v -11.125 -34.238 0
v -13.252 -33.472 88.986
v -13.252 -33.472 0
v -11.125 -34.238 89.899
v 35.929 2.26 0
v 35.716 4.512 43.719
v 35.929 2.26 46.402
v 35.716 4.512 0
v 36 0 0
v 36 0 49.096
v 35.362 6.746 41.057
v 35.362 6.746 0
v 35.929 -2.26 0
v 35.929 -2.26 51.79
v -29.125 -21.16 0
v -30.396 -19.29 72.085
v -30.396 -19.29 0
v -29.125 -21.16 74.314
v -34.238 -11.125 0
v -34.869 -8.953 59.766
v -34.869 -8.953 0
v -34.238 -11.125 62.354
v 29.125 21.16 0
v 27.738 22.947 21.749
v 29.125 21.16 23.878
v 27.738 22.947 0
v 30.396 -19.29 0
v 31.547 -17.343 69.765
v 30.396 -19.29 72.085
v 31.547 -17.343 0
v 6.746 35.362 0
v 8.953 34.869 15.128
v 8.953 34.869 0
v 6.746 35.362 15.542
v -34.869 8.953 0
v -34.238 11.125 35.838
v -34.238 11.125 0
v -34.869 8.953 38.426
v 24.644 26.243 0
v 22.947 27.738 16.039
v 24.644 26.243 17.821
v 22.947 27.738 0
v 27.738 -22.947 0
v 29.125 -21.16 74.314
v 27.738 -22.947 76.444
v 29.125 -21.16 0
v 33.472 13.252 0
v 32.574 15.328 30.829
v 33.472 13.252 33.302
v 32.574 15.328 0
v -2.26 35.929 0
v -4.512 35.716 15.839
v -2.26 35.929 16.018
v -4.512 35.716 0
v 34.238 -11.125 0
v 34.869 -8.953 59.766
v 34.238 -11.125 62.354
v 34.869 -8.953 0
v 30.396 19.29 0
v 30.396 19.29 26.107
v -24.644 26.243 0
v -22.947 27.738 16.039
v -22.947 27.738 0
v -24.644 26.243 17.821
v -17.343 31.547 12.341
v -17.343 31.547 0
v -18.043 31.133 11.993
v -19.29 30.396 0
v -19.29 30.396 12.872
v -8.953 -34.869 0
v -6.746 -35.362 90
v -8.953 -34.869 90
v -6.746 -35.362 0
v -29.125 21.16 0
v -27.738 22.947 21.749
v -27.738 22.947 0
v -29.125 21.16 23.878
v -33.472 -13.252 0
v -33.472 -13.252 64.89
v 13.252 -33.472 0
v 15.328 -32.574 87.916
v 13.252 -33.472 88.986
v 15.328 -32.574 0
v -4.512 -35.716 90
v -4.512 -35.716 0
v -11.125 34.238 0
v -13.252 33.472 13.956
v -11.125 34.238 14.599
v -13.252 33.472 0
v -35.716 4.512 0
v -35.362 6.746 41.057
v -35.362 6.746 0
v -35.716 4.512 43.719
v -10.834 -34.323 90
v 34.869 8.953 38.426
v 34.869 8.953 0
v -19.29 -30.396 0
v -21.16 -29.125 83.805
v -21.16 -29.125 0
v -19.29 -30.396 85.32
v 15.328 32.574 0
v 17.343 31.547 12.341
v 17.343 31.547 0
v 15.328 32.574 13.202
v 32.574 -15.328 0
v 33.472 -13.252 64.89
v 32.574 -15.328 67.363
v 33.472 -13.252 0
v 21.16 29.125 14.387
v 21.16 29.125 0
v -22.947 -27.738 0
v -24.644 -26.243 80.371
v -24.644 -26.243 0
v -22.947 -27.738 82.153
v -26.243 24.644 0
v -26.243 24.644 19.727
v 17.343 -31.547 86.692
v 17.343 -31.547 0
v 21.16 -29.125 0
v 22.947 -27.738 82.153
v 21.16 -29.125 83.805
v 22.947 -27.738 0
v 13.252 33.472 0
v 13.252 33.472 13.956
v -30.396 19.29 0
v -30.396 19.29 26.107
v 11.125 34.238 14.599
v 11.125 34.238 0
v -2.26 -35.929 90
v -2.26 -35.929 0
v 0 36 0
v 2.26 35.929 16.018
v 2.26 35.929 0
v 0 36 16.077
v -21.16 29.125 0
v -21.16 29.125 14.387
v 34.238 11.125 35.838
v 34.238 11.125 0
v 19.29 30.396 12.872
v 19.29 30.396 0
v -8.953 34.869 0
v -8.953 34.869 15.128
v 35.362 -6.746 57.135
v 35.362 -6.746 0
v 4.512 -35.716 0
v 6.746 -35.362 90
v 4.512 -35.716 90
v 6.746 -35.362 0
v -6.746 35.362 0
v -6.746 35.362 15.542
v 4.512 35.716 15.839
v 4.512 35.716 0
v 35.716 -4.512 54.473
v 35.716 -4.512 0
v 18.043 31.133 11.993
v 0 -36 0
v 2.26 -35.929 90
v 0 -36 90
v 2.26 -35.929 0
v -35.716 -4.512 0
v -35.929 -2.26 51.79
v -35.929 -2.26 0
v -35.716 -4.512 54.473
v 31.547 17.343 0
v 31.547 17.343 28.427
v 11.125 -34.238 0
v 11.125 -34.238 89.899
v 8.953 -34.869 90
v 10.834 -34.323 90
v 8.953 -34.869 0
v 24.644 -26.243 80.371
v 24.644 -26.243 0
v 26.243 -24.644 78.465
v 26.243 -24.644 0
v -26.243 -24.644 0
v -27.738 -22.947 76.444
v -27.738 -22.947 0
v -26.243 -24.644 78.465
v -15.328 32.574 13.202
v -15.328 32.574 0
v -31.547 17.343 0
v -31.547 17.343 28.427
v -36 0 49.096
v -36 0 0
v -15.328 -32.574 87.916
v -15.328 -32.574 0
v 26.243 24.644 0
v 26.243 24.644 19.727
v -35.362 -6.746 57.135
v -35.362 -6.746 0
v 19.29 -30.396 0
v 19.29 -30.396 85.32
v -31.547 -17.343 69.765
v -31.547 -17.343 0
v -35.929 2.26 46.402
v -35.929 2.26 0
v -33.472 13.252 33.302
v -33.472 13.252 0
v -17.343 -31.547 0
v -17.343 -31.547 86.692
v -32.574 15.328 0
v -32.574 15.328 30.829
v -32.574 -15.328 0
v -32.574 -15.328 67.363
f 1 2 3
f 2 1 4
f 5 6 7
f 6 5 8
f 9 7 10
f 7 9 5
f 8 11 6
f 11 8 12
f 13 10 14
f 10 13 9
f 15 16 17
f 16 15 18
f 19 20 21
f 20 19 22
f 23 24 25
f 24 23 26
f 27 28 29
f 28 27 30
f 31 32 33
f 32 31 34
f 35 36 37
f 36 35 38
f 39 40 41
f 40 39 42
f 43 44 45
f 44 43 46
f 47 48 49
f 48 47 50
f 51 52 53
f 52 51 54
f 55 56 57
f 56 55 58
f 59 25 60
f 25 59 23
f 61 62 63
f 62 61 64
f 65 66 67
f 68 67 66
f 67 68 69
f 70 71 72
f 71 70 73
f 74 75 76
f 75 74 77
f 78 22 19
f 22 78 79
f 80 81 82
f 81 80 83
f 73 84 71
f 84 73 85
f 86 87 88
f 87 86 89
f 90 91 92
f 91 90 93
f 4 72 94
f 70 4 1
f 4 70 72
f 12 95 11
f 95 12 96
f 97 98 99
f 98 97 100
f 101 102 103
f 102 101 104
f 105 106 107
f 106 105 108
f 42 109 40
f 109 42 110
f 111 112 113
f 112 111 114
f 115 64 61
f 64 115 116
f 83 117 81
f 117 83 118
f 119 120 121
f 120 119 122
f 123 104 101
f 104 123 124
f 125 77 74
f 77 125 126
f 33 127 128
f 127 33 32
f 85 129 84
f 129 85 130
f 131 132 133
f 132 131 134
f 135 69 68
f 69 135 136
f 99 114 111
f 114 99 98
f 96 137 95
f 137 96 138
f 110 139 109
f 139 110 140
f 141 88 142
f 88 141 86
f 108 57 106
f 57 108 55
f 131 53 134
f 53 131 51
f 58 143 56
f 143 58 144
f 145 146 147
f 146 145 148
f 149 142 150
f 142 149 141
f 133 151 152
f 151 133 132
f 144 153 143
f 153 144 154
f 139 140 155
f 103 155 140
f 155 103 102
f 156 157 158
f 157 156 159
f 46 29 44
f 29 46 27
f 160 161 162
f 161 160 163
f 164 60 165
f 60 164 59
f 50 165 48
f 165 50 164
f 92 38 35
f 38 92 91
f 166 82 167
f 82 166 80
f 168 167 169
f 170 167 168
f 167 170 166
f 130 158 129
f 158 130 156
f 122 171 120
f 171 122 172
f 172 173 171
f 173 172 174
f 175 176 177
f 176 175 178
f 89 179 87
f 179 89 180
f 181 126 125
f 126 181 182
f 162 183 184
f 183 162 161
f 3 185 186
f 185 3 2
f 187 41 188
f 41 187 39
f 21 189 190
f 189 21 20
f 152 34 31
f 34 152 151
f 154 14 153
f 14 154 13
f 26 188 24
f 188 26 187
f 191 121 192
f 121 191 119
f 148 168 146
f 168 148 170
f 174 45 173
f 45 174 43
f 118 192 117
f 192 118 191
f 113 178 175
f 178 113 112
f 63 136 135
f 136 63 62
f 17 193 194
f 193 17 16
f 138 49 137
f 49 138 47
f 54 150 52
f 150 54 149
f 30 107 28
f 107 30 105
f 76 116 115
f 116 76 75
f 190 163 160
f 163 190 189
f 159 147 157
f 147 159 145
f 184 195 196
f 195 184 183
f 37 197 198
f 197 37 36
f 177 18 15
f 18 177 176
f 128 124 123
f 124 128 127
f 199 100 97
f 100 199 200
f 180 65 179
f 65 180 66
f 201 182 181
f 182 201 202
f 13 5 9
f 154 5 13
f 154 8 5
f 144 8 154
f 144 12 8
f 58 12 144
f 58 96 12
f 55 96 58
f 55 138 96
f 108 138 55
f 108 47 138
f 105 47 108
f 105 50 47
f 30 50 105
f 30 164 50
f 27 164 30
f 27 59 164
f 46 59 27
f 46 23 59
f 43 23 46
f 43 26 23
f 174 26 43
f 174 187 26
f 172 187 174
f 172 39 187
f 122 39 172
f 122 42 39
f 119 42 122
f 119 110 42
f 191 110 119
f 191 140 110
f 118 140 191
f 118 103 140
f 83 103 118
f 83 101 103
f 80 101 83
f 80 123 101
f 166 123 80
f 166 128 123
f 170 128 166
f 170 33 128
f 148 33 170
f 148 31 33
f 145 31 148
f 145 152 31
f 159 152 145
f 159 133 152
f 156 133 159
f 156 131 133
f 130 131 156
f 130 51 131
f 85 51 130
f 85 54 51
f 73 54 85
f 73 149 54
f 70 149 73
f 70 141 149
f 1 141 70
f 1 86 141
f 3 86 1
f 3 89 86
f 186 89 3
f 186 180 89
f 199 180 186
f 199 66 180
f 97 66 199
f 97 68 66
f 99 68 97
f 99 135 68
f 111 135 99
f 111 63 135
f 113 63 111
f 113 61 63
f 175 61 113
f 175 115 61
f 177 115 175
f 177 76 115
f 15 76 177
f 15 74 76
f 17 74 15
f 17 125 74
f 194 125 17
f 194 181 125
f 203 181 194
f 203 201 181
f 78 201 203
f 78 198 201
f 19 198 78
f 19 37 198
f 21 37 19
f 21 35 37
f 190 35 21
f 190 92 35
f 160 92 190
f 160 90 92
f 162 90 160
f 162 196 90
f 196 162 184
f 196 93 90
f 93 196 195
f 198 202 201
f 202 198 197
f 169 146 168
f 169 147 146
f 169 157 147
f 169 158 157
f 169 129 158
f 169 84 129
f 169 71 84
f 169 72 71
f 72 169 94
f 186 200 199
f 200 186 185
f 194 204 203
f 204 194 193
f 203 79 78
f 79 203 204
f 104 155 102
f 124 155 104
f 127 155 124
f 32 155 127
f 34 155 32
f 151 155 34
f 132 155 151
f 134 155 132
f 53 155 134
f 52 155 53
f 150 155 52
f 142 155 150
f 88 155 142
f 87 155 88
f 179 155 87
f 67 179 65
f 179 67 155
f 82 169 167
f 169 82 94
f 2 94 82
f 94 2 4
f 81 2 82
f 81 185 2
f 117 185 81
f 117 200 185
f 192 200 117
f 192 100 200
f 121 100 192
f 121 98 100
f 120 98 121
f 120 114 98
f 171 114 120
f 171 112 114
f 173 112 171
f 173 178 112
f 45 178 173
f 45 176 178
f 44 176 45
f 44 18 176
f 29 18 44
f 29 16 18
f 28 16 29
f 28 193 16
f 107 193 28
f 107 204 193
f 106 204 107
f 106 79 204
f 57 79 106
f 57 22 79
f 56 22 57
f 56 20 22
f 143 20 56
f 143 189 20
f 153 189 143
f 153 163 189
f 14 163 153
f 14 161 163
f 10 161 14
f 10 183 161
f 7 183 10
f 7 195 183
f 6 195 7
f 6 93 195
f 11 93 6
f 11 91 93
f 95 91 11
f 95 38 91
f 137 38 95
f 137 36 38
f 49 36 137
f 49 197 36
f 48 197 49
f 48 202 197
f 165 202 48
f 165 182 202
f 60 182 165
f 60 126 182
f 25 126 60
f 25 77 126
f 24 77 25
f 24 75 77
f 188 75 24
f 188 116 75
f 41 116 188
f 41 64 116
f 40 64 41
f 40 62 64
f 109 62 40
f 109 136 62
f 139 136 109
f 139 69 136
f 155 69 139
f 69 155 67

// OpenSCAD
// Mark Benson

// 23/07/2013

// Creative commons non commercial

// Wheel for maze mouse
// Shaft fitting for 28BYJ-48 geared stepper
// http://www.thingiverse.com/thing:122070

difference()
{
    
    
    //striker 
    //translate([60,0,0])
    fooz = 36; //diameter of a foosball is 36mm 
    strike_height =90;
    
    //cut at an angle
    difference()
    {
        cylinder(r=fooz,h=strike_height,$fn=100);  
        translate([0,fooz/1.5  , strike_height * .85]) 
        rotate([40,0,0]) 
        cube([fooz*2, fooz*2, fooz*3],center=true);
        
    }   
   
   /*
	union()
	{
		//rim
		cylinder(r=60/2,h=4,$fn=100);

		//boss
		cylinder(r=12/2,h=7,$fn=100);
	}

	union()
	{
		//shaft cutout (shaft with flat)
		translate([0,0,1])
		intersection()
		{
			cylinder(r=5/2,h=8,$fn=40);
			translate([0,0,4]) cube([3,8,10], center=true);
		}

		//rim groove cutout
		translate([0,0,2])
		rotate_extrude(convexity=10, $fn=100)
		translate([30,0,10])
		rotate([0,0,45])
		square([2,2],center=true);

		//holes in the wheel
		for(i = [0:5])
		{
			rotate(i*360/6,[0,0,1])
			translate([19,0,-1])
			cylinder(r=17.5/2,h=8,$fn=40);
		}

	}
    */
    
    
   
}
